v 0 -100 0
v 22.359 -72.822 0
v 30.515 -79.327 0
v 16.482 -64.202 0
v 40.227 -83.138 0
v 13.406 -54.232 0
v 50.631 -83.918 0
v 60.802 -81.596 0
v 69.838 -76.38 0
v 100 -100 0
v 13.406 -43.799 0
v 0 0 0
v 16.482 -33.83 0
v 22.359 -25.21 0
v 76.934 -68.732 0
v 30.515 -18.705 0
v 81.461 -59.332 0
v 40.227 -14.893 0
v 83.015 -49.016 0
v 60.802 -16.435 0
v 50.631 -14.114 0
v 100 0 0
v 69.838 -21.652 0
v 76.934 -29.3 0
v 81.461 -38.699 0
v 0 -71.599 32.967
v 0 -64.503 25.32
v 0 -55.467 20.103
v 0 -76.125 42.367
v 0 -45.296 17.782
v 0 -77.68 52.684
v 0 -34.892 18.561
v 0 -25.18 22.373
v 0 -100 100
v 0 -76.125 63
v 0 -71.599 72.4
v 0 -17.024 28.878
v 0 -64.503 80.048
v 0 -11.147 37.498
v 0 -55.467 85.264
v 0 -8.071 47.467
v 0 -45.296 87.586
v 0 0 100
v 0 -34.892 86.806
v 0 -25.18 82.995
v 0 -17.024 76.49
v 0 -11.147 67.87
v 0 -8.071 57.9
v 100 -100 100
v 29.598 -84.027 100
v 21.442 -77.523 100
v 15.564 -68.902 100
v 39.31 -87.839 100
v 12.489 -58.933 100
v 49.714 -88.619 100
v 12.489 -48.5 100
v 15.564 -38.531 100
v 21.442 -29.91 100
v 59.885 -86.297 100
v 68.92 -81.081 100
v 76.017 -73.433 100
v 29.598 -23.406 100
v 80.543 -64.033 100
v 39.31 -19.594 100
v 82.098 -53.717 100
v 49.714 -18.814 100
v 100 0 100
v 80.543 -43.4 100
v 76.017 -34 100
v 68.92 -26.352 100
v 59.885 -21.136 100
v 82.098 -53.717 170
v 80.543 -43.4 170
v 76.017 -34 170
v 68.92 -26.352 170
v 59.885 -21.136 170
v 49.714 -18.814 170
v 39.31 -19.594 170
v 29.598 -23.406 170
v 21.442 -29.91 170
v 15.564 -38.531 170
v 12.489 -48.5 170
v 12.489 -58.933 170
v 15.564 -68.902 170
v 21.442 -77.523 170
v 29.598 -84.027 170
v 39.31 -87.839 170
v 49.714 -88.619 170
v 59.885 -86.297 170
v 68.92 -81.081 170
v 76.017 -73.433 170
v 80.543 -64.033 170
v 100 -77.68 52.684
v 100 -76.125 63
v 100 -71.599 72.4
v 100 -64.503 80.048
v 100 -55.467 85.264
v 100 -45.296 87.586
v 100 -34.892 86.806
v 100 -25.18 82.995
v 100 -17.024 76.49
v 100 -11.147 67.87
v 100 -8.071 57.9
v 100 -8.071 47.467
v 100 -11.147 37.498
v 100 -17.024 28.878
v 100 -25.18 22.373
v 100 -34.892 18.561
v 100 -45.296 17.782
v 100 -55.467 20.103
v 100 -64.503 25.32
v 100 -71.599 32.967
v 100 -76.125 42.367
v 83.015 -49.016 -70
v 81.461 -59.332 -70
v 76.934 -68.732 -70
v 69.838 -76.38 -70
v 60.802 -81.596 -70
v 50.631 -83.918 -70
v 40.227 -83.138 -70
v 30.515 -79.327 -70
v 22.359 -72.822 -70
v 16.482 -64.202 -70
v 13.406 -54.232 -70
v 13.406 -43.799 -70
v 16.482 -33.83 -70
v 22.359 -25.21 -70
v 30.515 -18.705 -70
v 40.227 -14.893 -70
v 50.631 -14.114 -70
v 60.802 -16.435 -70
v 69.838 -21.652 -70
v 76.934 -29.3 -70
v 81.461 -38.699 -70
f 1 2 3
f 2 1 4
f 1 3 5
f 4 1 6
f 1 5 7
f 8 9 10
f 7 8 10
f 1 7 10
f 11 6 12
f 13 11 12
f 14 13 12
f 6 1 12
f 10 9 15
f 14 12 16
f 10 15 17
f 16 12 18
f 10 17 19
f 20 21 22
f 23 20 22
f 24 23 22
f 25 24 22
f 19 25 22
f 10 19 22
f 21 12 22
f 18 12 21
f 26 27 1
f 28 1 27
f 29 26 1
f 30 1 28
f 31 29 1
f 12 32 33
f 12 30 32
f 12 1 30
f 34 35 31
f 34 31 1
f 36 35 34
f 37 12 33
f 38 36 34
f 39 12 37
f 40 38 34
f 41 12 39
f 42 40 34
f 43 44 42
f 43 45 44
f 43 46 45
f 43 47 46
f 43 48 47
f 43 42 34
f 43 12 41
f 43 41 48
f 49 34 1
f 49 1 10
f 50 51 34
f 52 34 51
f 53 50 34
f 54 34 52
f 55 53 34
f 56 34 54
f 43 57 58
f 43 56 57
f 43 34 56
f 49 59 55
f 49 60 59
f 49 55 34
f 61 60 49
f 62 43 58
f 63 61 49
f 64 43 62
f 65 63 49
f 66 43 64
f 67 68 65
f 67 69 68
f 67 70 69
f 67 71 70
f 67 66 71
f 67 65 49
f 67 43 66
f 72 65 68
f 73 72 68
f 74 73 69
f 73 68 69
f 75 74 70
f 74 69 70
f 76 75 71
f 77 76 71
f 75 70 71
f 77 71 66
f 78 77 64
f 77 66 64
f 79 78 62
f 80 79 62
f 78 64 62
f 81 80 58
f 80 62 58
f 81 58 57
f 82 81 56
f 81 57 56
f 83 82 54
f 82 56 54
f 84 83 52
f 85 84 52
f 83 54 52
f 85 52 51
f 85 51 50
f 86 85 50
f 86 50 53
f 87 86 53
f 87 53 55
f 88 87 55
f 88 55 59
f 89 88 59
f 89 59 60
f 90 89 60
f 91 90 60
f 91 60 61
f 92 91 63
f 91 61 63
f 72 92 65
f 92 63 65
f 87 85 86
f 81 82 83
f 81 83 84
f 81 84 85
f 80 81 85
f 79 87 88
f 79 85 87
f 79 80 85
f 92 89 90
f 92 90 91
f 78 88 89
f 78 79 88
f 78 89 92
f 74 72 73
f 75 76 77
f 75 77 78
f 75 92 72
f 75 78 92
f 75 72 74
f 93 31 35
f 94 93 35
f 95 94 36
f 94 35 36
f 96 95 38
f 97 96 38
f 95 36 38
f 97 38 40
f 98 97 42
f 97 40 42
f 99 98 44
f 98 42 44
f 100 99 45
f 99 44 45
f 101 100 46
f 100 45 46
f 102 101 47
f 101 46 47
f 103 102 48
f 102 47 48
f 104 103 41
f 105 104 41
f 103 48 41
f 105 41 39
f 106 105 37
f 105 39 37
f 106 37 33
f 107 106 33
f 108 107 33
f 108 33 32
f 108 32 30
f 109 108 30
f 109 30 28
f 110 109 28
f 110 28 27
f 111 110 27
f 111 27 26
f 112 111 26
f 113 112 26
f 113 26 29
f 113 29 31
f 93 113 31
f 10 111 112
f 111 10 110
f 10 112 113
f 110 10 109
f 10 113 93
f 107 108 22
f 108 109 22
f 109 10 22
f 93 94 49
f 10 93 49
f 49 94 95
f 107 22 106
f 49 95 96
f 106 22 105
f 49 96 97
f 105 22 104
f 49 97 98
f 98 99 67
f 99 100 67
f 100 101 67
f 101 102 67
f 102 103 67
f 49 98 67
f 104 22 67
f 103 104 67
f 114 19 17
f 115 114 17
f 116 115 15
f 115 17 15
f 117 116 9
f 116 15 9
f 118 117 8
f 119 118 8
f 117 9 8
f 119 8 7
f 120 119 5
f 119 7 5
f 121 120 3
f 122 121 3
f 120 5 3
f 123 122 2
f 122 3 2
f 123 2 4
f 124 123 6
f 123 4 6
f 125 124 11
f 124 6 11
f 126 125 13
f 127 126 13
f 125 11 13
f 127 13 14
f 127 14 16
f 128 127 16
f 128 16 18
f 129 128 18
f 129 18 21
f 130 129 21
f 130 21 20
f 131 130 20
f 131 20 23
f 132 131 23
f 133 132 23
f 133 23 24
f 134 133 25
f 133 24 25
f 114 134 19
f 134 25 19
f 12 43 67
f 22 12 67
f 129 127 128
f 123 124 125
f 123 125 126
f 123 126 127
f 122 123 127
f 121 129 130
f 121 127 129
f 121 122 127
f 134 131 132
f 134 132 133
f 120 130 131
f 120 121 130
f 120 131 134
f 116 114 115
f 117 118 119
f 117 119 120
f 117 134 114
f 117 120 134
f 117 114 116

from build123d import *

# Parameters (mm, degrees)
F0_W     = 100
F0_H     = 100
F1_DEPTH = 100
F2_R     = 35
F3_DEPTH = 70
F4_R     = 35
F5_DEPTH = 70
F7_D     = 70


with BuildPart() as f1:
    # F0 (on Front) → F1 (new body)
    with BuildSketch(Plane.XZ):
        with Locations((50, 50)):
            Rectangle(F0_W, F0_H)
    extrude(amount=F1_DEPTH)

    # F2 (on face) → F3 (join)
    with BuildSketch(Plane(origin=(0, 0, 0), x_dir=(1, 0, 0), z_dir=(0, 0, -1))):
        with Locations((48.01549, 49.015835)):
            Circle(F2_R)
    extrude(amount=F3_DEPTH)

    # F4 (on face) → F5 (join)
    with BuildSketch(Plane.XY.offset(100)):
        with Locations((47.09832, -53.716522)):
            Circle(F4_R)
    extrude(amount=F5_DEPTH)

    # F7 (through all)
    with Locations(Plane.YZ.offset(100)):
        with Locations((-42.680413, 52.683681)):
            Hole(F7_D / 2)


solid = f1.part
